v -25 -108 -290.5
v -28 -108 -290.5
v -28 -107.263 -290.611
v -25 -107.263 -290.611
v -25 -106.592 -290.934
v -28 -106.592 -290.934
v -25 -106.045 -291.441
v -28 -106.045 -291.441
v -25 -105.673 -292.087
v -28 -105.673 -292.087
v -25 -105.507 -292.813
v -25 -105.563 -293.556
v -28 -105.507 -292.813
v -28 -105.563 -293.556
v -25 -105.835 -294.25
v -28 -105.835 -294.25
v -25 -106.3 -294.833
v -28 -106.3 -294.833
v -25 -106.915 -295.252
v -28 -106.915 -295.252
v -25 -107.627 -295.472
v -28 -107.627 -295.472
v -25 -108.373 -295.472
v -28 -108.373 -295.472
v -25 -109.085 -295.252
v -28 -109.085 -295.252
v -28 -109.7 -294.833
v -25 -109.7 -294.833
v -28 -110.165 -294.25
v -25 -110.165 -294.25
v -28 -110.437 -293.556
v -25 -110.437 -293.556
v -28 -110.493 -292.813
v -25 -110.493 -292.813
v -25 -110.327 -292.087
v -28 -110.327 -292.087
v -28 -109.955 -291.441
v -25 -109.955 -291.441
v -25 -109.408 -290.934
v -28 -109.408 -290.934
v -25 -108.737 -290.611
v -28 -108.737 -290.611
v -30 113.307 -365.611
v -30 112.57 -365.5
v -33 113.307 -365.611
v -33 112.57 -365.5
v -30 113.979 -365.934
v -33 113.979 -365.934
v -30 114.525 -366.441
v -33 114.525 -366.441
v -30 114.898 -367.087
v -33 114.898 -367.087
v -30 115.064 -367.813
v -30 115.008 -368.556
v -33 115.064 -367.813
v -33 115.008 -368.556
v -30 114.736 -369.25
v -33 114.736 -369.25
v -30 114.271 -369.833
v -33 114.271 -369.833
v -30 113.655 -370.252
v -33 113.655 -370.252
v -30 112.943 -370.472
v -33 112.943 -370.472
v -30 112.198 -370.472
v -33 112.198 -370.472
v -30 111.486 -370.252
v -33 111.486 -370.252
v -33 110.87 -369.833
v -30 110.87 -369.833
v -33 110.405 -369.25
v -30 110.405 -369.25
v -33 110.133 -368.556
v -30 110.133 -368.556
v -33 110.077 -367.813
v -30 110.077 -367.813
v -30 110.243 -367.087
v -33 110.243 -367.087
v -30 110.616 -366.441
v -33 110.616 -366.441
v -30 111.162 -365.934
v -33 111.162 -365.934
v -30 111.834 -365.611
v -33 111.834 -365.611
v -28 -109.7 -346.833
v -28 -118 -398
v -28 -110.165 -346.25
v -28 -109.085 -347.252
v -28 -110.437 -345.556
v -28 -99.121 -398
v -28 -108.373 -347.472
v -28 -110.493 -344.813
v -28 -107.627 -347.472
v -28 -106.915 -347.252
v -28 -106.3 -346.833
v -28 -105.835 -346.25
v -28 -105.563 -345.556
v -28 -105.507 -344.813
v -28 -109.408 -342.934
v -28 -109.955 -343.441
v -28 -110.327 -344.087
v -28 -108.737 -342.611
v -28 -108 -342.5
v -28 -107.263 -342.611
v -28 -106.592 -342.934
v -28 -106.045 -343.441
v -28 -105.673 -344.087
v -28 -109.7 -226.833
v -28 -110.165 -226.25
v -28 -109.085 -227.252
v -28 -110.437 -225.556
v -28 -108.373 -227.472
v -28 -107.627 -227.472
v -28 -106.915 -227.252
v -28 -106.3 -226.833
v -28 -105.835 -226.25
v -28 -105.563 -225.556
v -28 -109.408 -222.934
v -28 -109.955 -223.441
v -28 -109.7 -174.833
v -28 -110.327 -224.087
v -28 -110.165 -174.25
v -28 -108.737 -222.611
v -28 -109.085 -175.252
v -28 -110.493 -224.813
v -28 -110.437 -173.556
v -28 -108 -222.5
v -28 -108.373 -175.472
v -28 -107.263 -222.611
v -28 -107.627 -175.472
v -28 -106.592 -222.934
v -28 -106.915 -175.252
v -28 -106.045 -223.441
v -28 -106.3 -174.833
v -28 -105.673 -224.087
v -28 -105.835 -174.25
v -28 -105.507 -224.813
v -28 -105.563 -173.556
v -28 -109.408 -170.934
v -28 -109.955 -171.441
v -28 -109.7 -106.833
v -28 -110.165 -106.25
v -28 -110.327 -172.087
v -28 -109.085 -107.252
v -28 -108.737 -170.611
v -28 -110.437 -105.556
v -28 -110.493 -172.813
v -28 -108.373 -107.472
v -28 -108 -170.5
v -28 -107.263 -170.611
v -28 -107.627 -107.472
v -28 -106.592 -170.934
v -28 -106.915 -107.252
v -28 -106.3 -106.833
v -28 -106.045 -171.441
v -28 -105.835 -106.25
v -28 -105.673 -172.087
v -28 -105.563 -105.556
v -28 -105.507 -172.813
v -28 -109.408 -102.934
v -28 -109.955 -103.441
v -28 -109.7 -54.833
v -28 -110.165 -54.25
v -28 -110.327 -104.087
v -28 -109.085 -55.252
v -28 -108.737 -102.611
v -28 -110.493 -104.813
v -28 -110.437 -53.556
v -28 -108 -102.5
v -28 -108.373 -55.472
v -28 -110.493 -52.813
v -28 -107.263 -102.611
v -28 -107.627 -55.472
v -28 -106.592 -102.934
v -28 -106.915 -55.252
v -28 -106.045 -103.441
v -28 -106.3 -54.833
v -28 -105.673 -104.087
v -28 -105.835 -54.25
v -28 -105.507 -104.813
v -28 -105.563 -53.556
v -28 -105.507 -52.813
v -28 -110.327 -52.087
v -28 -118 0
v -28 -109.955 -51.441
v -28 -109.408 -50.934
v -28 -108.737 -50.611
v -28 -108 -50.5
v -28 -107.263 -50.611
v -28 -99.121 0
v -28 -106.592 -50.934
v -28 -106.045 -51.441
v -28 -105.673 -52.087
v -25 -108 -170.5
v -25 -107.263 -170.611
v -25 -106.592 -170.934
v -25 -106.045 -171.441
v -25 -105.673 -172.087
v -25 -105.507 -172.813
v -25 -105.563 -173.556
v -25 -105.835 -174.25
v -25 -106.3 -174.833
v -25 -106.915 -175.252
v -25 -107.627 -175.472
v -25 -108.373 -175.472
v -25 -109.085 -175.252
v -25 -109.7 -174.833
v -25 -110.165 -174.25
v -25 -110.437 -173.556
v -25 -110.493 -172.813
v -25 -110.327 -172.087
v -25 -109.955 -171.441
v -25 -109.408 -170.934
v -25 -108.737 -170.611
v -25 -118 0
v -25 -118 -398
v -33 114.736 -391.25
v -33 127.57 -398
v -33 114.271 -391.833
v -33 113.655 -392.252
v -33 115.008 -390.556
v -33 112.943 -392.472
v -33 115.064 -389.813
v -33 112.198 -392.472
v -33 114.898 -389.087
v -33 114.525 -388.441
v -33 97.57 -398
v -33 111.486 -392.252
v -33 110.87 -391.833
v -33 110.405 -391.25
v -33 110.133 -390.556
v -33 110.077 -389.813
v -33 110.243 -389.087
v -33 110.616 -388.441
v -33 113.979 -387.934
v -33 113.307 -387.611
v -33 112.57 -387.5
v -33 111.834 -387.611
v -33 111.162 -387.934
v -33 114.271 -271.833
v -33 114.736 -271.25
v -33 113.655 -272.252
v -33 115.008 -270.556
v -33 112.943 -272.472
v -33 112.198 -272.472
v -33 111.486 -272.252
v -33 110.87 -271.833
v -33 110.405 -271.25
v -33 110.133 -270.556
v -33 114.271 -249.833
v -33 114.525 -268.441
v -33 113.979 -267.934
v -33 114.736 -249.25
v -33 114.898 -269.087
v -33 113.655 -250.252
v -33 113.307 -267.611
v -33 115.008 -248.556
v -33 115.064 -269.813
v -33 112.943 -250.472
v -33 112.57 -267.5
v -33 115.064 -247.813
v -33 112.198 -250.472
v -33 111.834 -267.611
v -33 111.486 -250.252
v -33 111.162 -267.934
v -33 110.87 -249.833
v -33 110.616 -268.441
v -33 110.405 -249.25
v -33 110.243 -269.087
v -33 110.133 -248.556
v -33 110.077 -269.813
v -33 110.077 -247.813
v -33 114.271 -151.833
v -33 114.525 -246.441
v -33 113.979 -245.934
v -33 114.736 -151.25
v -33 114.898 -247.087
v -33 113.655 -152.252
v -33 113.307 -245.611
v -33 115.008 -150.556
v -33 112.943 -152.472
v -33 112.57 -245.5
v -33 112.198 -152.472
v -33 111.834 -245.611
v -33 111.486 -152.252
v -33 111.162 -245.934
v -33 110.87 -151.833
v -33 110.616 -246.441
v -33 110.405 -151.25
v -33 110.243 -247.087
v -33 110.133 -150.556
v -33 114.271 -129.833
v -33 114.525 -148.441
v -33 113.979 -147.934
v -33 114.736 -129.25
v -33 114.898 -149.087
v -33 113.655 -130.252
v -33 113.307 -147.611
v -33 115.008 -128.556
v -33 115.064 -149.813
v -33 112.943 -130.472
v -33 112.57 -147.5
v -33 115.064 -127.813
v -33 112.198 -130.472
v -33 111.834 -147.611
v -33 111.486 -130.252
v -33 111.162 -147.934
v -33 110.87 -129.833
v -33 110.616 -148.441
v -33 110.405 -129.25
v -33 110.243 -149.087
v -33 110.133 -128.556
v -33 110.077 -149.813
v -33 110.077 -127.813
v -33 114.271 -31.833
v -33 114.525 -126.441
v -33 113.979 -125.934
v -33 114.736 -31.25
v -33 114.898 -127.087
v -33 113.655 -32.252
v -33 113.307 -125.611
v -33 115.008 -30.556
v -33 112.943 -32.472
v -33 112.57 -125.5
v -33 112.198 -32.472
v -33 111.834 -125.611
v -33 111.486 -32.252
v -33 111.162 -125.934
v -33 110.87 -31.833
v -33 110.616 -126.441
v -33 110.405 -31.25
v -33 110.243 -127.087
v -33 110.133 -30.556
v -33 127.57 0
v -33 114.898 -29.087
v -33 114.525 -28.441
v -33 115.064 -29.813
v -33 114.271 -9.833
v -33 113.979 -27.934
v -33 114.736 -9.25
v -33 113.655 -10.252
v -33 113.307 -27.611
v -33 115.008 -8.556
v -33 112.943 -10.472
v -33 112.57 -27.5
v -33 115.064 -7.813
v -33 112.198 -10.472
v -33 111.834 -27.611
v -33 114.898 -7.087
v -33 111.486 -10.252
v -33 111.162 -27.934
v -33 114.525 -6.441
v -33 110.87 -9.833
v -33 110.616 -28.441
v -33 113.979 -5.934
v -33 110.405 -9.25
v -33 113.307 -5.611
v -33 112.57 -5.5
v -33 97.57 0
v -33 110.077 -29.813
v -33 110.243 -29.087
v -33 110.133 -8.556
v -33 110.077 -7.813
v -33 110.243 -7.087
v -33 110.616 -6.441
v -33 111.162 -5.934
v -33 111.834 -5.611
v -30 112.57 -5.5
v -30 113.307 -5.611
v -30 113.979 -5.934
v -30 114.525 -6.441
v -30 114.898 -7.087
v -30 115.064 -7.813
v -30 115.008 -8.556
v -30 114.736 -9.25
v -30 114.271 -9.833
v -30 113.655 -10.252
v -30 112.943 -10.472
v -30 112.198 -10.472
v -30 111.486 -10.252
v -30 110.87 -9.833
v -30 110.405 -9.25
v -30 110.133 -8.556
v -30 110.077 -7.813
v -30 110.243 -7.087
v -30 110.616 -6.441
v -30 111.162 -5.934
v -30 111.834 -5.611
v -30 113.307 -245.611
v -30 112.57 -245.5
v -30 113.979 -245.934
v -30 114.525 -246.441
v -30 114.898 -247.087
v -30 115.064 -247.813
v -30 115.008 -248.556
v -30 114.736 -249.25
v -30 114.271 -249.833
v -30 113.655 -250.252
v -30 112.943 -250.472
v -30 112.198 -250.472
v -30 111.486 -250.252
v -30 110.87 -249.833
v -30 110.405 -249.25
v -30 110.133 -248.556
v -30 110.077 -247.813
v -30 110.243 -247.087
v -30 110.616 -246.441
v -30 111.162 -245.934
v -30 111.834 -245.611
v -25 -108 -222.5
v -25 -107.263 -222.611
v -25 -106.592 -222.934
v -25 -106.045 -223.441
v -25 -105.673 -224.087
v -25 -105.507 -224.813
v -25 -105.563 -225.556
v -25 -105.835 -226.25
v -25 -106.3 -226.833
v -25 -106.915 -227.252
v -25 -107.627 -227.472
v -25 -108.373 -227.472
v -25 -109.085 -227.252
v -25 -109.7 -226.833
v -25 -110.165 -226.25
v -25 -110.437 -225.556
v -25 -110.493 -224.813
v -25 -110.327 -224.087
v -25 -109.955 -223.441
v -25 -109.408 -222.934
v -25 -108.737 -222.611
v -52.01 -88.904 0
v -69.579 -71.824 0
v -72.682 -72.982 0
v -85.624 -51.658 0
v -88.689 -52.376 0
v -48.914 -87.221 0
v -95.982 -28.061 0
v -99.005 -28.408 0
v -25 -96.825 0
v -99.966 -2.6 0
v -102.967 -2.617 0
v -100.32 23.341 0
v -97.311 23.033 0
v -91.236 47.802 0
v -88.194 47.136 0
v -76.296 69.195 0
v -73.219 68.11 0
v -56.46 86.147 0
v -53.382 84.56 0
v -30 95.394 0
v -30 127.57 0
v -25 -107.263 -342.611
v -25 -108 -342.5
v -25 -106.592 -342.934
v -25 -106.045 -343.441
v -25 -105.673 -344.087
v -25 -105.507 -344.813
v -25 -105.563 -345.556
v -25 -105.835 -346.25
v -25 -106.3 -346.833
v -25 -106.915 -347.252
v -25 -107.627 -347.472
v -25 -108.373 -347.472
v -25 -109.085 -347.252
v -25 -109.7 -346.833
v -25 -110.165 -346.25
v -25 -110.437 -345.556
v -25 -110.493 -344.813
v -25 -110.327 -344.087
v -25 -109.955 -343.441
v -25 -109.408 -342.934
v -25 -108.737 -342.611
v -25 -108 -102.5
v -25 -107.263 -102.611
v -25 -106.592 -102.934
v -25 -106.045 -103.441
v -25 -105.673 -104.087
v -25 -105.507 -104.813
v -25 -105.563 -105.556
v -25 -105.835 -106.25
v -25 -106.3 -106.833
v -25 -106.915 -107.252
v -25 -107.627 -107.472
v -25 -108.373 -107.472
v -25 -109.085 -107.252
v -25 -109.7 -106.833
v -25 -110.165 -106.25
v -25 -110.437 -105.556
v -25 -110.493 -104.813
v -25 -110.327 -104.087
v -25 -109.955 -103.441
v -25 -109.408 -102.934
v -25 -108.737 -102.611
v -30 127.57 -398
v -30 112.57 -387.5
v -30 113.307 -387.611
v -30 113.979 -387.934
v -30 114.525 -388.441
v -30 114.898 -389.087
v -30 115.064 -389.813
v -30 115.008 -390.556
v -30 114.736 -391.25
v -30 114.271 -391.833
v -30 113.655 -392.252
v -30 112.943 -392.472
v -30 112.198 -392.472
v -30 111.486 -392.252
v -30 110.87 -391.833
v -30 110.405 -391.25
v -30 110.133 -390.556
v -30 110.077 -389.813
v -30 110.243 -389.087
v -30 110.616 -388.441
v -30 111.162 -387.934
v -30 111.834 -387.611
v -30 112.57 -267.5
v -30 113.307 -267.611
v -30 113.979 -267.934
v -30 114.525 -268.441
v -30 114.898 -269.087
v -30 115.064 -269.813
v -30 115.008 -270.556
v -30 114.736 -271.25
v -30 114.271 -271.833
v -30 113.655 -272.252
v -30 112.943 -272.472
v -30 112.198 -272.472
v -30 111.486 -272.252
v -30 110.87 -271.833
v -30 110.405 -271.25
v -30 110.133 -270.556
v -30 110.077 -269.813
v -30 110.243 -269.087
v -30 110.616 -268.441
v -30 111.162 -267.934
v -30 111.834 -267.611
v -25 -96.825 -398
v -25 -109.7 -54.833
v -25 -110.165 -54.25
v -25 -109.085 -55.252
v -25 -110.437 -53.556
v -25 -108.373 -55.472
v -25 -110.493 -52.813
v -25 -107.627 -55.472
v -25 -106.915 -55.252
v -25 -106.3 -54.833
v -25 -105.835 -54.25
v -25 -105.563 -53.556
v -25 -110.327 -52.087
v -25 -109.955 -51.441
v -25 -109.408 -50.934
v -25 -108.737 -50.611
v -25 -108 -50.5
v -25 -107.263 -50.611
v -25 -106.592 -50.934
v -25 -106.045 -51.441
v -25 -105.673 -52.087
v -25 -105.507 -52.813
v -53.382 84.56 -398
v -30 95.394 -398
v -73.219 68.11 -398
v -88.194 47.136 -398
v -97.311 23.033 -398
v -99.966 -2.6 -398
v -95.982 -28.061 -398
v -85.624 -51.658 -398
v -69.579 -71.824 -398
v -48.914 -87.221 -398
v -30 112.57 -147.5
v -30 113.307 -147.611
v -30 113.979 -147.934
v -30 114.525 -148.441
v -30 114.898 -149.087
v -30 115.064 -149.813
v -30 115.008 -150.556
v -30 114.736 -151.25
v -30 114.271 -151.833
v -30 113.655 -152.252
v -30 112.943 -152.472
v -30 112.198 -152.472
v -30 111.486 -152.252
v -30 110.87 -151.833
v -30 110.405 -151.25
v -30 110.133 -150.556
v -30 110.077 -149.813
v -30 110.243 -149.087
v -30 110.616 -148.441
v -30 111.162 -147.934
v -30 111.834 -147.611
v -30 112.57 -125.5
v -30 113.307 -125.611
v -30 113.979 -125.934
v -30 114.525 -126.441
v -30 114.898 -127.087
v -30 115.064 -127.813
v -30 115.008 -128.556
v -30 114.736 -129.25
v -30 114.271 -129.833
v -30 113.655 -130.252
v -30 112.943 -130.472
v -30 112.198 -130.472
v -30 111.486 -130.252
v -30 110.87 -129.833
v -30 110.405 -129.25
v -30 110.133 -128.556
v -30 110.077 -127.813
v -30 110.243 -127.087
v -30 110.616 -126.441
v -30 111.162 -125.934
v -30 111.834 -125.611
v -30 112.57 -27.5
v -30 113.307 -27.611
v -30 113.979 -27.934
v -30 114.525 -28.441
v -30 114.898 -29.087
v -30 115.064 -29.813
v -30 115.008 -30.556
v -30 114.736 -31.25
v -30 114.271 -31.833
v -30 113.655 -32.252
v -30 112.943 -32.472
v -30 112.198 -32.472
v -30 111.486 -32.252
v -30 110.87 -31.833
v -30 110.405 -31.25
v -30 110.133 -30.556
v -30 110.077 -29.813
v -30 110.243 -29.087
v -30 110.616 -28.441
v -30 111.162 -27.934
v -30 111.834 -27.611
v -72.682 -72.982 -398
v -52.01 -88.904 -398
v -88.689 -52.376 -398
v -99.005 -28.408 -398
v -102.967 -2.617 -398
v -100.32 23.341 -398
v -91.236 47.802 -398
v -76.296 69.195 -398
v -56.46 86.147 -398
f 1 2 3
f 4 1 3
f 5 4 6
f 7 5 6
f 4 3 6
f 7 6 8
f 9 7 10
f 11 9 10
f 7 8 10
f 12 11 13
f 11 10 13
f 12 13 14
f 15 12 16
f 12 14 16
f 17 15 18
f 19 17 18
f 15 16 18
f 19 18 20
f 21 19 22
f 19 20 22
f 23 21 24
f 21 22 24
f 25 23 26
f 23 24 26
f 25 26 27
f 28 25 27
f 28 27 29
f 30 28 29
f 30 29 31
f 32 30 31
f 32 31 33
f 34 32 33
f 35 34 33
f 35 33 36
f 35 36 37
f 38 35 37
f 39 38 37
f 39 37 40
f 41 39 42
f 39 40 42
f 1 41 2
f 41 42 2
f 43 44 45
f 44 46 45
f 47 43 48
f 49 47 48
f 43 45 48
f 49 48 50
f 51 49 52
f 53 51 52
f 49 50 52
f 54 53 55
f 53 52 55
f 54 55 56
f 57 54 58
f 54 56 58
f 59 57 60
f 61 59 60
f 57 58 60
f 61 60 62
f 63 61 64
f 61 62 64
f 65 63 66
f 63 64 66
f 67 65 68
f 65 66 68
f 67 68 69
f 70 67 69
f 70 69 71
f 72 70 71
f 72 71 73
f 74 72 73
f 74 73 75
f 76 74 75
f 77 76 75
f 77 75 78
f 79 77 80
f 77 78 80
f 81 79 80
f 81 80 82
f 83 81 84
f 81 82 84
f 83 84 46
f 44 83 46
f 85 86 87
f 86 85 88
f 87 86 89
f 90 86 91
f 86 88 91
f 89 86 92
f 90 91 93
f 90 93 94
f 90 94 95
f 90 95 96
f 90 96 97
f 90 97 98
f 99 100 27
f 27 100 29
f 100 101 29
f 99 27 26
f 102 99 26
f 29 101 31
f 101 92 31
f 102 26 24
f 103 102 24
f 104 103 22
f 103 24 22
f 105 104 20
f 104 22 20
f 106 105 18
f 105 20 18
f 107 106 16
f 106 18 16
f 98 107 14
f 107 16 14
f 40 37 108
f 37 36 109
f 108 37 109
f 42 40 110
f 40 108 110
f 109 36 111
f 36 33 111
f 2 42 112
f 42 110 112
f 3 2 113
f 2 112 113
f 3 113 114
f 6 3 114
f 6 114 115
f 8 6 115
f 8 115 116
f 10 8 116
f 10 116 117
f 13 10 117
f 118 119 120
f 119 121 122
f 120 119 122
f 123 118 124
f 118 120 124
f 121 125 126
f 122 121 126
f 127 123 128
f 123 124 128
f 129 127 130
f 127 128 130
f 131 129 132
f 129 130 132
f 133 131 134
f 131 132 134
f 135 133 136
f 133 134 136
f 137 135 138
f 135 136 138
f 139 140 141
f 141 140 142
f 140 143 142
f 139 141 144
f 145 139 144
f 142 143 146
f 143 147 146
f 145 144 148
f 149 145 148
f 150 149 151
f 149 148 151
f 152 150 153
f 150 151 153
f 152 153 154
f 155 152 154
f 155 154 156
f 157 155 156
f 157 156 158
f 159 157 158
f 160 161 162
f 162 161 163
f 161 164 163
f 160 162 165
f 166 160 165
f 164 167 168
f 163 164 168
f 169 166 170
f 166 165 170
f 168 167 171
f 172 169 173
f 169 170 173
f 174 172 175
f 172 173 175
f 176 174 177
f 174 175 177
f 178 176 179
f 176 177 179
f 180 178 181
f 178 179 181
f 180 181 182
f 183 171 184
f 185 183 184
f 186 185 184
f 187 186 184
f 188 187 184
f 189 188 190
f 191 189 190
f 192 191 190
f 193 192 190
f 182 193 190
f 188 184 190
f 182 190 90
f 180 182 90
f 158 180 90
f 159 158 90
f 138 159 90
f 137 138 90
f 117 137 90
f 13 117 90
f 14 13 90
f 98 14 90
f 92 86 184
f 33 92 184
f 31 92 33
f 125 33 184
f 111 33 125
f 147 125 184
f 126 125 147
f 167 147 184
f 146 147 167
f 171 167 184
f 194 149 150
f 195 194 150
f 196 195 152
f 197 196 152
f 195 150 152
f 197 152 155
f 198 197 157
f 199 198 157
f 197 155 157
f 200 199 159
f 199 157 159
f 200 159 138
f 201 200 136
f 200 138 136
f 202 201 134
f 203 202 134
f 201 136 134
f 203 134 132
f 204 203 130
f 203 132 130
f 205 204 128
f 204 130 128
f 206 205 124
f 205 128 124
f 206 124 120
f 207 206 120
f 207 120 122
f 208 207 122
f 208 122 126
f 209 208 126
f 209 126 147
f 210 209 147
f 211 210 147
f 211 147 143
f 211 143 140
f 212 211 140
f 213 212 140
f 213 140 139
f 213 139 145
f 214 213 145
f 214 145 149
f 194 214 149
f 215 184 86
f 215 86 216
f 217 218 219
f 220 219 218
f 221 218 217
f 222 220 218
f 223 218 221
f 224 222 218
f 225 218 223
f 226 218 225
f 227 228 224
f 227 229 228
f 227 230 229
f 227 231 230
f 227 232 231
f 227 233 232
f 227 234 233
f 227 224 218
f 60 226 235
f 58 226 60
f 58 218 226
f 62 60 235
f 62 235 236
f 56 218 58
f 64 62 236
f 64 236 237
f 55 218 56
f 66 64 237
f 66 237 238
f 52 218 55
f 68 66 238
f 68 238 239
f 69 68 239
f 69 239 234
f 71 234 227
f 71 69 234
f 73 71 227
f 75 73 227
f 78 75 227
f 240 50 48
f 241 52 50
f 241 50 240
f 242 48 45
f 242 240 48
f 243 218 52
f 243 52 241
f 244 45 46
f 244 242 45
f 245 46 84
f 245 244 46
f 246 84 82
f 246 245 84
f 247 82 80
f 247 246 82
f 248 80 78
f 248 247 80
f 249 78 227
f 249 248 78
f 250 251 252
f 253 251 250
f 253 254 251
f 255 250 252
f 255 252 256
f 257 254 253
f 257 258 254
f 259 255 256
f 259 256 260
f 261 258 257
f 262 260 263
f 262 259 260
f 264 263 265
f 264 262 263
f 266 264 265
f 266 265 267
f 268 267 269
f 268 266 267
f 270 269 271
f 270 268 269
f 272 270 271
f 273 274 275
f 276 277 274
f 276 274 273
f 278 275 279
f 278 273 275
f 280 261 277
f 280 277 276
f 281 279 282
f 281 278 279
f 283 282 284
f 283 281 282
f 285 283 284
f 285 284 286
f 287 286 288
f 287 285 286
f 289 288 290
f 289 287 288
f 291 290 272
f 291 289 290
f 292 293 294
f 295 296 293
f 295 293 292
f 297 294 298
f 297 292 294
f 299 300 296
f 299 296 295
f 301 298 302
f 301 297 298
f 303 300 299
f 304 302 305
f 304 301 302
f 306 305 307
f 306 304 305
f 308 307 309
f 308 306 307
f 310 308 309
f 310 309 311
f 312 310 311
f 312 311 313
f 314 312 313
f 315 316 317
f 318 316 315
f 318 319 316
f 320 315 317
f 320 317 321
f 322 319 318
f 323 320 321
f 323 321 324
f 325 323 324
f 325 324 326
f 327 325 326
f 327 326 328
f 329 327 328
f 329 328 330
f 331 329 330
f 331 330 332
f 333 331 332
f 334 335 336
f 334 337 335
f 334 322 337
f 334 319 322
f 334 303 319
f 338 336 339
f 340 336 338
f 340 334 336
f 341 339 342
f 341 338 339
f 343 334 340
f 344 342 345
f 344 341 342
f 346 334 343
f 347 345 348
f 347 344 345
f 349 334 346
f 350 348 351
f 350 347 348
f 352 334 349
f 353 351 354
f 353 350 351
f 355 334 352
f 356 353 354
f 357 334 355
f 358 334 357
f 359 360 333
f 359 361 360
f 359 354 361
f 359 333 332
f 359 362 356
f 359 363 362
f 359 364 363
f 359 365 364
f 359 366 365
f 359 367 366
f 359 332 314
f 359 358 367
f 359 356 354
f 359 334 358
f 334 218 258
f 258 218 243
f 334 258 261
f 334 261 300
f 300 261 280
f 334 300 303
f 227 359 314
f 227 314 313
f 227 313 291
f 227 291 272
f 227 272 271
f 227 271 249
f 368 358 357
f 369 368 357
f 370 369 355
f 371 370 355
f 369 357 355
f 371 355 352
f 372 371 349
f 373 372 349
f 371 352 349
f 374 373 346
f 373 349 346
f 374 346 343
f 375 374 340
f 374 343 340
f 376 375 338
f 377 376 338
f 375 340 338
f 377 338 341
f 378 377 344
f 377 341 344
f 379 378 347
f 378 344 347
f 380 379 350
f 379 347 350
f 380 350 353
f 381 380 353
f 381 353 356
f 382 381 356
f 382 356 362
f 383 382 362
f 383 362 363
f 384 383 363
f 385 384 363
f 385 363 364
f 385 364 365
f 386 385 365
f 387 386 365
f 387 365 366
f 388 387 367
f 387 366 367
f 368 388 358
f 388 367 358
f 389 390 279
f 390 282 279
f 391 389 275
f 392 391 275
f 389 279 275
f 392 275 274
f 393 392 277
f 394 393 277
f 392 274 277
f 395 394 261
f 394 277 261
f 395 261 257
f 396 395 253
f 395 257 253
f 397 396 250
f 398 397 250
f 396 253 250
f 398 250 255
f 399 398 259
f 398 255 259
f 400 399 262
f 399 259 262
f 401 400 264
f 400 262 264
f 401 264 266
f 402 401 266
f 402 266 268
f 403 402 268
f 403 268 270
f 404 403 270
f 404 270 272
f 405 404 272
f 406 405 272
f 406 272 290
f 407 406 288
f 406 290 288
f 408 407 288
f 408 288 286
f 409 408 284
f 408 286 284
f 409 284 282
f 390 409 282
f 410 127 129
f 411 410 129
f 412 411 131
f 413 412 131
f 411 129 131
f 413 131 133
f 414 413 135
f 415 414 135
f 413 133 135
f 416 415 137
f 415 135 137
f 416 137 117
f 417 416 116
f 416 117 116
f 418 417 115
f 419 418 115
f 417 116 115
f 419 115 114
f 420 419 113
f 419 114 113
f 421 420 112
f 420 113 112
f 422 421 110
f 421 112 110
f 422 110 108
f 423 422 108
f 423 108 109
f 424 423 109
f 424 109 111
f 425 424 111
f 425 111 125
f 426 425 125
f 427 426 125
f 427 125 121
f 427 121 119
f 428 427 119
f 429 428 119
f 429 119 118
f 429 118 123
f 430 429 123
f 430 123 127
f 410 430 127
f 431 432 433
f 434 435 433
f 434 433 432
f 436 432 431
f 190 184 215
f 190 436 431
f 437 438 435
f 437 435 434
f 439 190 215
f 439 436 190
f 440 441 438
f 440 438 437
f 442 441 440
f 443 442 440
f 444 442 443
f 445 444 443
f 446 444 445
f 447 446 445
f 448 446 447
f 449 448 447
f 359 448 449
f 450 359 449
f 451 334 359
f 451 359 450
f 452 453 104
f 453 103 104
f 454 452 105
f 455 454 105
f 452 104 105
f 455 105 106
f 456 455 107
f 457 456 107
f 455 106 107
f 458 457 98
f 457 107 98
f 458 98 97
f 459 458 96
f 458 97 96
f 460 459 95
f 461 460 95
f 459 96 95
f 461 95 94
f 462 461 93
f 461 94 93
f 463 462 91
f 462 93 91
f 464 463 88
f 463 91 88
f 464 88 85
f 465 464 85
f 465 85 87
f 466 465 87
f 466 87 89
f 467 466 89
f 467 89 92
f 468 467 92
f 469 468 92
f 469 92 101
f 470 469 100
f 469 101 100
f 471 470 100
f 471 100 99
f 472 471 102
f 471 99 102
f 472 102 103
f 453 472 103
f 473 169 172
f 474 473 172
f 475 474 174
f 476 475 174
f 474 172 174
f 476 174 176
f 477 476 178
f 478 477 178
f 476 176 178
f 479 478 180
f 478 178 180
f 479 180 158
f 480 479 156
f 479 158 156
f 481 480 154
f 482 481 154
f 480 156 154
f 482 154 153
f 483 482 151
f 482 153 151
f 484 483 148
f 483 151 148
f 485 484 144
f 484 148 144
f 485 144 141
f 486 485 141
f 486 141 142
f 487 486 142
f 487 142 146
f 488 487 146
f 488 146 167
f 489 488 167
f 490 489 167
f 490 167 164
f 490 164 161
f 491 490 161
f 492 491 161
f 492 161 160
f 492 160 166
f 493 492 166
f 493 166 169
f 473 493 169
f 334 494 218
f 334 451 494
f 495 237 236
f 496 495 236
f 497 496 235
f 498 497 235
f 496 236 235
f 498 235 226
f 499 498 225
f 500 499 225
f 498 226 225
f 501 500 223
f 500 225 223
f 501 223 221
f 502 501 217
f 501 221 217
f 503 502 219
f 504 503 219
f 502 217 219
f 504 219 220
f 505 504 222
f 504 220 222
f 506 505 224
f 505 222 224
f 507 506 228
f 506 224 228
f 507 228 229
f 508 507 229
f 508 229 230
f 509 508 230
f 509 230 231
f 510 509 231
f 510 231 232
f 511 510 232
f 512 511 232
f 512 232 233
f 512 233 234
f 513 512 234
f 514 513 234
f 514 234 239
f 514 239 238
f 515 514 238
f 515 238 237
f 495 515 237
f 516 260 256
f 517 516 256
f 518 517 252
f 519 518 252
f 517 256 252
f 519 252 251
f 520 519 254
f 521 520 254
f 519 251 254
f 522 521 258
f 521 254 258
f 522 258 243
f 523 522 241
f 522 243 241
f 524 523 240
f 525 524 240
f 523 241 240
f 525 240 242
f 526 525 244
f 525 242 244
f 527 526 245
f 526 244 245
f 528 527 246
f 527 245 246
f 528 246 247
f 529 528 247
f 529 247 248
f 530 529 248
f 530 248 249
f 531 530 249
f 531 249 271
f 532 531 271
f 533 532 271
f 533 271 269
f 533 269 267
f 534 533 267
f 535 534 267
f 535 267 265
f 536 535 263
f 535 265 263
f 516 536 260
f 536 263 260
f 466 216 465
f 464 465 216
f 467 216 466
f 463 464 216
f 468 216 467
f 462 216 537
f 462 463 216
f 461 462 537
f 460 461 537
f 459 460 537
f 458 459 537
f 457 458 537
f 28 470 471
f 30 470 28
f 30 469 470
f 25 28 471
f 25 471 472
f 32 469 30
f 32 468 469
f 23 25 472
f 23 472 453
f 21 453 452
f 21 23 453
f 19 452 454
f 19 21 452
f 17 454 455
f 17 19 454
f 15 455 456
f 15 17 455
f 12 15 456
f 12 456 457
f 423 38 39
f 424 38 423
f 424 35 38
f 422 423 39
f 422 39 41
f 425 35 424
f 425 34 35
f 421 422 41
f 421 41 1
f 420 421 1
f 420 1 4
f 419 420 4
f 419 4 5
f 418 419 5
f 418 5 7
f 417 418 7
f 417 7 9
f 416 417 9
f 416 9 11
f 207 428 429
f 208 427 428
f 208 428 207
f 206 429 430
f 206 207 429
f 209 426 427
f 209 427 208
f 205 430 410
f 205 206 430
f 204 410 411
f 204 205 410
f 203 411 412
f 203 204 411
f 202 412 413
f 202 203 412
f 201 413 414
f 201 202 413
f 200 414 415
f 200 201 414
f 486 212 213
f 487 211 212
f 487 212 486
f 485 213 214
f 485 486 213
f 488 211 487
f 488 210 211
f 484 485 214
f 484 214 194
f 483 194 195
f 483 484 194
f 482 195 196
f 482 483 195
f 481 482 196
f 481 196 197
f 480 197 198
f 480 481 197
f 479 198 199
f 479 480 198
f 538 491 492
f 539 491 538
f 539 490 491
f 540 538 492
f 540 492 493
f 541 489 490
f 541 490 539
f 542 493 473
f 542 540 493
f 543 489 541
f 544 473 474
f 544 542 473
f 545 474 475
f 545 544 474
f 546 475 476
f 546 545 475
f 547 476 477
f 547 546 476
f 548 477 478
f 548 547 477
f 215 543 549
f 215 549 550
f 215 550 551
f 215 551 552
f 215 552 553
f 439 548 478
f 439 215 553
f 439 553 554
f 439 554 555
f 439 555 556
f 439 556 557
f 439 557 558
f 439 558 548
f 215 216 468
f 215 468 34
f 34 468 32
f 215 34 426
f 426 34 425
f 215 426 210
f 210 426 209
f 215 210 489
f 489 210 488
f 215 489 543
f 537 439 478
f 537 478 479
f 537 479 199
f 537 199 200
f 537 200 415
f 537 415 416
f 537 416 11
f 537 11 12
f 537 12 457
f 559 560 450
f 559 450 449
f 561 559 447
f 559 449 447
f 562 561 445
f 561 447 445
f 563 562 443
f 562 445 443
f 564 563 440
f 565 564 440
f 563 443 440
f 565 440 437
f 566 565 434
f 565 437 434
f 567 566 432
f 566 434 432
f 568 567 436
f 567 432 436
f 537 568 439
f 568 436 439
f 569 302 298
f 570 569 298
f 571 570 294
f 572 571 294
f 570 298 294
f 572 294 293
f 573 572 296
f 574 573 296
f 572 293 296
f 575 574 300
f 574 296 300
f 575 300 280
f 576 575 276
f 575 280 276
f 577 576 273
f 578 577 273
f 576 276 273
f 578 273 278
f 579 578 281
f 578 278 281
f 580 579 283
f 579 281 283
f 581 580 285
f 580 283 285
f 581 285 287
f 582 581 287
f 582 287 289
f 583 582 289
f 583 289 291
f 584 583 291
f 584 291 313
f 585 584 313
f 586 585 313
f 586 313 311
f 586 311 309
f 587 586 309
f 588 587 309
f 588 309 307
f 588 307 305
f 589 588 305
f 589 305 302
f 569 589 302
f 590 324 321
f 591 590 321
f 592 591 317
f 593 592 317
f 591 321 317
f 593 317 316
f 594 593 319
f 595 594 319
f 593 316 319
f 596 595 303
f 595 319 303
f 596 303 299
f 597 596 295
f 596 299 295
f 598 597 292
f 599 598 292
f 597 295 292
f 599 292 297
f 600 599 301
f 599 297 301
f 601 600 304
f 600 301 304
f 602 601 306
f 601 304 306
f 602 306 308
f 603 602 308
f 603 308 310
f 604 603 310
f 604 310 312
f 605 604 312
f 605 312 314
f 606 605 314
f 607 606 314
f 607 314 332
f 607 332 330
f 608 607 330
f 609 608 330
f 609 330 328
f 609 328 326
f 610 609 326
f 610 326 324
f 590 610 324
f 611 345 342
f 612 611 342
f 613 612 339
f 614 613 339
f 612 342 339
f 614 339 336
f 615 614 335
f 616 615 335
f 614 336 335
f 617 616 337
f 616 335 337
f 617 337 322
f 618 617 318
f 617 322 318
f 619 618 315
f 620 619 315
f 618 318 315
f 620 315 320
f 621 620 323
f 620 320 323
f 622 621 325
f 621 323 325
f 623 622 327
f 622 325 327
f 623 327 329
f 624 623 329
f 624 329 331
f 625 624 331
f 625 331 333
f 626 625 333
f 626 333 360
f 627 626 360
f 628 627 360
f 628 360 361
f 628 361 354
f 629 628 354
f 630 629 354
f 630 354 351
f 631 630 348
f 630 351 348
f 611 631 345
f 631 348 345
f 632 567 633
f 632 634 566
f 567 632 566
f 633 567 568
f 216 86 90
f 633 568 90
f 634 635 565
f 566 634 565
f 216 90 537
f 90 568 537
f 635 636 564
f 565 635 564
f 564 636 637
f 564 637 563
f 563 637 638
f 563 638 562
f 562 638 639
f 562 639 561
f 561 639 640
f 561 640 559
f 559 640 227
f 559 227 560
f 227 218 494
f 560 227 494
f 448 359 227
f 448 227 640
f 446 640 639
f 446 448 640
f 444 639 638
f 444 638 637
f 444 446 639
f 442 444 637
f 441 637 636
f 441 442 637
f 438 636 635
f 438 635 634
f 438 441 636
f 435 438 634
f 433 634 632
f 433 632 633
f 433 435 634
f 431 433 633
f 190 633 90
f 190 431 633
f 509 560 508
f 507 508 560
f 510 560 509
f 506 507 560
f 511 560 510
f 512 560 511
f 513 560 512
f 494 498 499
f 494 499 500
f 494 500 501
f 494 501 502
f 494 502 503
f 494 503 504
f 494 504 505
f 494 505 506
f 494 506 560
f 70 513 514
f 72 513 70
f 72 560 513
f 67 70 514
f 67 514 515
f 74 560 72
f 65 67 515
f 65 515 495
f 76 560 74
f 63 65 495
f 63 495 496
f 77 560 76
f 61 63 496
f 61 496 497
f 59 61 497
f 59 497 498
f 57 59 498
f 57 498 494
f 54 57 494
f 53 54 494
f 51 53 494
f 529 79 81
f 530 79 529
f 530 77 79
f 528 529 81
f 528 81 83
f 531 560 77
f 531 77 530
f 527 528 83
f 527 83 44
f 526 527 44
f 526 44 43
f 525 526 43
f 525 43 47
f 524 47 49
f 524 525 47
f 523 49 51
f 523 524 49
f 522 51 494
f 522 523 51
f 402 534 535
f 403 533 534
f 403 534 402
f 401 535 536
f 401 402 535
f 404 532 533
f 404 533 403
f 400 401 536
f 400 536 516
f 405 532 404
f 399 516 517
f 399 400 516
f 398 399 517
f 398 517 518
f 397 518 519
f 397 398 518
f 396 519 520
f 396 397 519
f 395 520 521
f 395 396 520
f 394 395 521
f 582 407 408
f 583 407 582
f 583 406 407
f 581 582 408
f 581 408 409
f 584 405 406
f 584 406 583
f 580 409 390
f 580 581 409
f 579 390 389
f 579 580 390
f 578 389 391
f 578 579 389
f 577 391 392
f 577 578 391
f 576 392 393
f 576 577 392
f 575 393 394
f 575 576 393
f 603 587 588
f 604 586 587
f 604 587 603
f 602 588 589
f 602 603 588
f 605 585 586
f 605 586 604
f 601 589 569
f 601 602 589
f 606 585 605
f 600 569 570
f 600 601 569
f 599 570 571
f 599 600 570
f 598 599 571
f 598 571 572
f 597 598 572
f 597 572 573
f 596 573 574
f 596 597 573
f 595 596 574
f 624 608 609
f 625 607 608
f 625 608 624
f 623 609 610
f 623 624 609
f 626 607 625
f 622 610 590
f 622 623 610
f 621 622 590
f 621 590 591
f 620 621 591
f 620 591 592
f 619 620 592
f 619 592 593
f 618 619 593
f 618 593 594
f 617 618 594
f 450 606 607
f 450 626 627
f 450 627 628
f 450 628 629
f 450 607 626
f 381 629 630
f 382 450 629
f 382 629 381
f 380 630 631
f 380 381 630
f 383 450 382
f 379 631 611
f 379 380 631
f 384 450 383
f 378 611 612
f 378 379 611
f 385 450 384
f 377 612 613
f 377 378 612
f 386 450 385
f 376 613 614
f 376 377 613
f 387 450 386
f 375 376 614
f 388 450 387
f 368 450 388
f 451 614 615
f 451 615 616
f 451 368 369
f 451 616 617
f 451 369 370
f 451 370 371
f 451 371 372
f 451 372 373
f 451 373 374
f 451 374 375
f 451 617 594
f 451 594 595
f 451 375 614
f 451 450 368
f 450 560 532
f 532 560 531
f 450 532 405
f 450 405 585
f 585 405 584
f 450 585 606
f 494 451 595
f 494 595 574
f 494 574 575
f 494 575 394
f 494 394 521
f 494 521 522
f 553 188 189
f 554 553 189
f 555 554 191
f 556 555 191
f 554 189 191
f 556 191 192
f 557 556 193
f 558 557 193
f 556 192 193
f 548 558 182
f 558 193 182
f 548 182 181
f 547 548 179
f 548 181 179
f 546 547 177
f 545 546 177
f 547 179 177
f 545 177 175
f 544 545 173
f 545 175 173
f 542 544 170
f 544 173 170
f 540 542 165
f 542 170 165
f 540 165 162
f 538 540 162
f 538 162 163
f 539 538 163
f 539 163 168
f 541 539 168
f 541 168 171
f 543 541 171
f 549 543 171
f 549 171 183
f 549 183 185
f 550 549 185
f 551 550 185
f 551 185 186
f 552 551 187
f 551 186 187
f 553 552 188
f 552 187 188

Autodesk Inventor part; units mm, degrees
ref_plane "YZ Plane" through (0, 0, 0) normal (1, 0, 0) x (0, 1, 0)
ref_plane "XZ Plane" through (0, 0, 0) normal (0, 1, 0) x (-1, 0, 0)
ref_plane "XY Plane" through (0, 0, 0) normal (0, 0, 1) x (1, 0, 0)
sketch "草图1" plane through (0, 0, 0) normal (0, 0, 1) x (1, 0, 0)
  circle A0 centre (0, 0) radius 100
  line L0 (-25, -96.8246) -> (25, -96.8246)
  line L1 (25, -96.8246) -> (25, -118)
  line L2 (25, -118) -> (-25, -118)
  line L3 (-25, -118) -> (-25, -96.8246)
  arc A1 (-33, 97.5705) -> (-28, -99.1211) centre (0, 0) ccw
  line L4 (-28, -118) -> (-28, -99.1211)
  line L5 (-28, -118) -> (-25, -118)
  line L6 (-30, 95.3939) -> (-30, 127.5705)
  line L7 (-30, 127.5705) -> (-33, 127.5705)
  line L8 (-33, 127.5705) -> (-33, 97.5705)
  line L9 (0, -100) -> (25, -100)
  dimension "d0" = 200
  dimension "d2" = 50
  dimension "d3" = 33
  dimension "d4" = 3
  dimension "d5" = 3
  dimension "d6" = 3
  dimension "d7" = 30
  dimension "d10" = 18
extrude "拉伸1" add sketch "草图1" against normal blind 398 contours A0 L3 L5 L4 A1 L8 L7 L6
sketch "草图2" plane through (-28, -118, 0) normal (-1, 0, 0) x (0, 0, 1)
  circle A0 centre (-53, 10) radius 2.5
  circle A1 centre (-105, 10) radius 2.5
  line L0 (0, 18.8789) -> (0, 0) projected
  line L1 (0, 0) -> (-398, 0) projected
  point P0 (0, 118)
  dimension "d11" = 5
  dimension "d12" = 5
  dimension "d13" = 53
  dimension "d14" = 105
  dimension "d15" = 10
  dimension "d16" = 10
extrude "拉伸2" cut sketch "草图2" against normal blind 3
pattern_linear "矩形阵列1" count 3 spacing 120 along (0, 0, -1) of "拉伸2"
sketch "草图3" plane through (-33, 97.5705, 0) normal (-1, 0, 0) x (0, 0, 1)
  circle A0 centre (-8, 15) radius 2.5
  circle A1 centre (-30, 15) radius 2.5
  line L0 (0, 30) -> (0, 0) projected
  line L1 (0, 30) -> (-398, 30) projected
  point P0 (0, -97.5705)
  dimension "d22" = 5
  dimension "d23" = 5
  dimension "d24" = 8
  dimension "d25" = 30
  dimension "d26" = 15
  dimension "d27" = 15
extrude "拉伸3" cut sketch "草图3" against normal blind 3
pattern_linear "矩形阵列2" count 4 spacing 120 along (0, 0, -1) of "拉伸3"
properties part number "装填斗罩"
